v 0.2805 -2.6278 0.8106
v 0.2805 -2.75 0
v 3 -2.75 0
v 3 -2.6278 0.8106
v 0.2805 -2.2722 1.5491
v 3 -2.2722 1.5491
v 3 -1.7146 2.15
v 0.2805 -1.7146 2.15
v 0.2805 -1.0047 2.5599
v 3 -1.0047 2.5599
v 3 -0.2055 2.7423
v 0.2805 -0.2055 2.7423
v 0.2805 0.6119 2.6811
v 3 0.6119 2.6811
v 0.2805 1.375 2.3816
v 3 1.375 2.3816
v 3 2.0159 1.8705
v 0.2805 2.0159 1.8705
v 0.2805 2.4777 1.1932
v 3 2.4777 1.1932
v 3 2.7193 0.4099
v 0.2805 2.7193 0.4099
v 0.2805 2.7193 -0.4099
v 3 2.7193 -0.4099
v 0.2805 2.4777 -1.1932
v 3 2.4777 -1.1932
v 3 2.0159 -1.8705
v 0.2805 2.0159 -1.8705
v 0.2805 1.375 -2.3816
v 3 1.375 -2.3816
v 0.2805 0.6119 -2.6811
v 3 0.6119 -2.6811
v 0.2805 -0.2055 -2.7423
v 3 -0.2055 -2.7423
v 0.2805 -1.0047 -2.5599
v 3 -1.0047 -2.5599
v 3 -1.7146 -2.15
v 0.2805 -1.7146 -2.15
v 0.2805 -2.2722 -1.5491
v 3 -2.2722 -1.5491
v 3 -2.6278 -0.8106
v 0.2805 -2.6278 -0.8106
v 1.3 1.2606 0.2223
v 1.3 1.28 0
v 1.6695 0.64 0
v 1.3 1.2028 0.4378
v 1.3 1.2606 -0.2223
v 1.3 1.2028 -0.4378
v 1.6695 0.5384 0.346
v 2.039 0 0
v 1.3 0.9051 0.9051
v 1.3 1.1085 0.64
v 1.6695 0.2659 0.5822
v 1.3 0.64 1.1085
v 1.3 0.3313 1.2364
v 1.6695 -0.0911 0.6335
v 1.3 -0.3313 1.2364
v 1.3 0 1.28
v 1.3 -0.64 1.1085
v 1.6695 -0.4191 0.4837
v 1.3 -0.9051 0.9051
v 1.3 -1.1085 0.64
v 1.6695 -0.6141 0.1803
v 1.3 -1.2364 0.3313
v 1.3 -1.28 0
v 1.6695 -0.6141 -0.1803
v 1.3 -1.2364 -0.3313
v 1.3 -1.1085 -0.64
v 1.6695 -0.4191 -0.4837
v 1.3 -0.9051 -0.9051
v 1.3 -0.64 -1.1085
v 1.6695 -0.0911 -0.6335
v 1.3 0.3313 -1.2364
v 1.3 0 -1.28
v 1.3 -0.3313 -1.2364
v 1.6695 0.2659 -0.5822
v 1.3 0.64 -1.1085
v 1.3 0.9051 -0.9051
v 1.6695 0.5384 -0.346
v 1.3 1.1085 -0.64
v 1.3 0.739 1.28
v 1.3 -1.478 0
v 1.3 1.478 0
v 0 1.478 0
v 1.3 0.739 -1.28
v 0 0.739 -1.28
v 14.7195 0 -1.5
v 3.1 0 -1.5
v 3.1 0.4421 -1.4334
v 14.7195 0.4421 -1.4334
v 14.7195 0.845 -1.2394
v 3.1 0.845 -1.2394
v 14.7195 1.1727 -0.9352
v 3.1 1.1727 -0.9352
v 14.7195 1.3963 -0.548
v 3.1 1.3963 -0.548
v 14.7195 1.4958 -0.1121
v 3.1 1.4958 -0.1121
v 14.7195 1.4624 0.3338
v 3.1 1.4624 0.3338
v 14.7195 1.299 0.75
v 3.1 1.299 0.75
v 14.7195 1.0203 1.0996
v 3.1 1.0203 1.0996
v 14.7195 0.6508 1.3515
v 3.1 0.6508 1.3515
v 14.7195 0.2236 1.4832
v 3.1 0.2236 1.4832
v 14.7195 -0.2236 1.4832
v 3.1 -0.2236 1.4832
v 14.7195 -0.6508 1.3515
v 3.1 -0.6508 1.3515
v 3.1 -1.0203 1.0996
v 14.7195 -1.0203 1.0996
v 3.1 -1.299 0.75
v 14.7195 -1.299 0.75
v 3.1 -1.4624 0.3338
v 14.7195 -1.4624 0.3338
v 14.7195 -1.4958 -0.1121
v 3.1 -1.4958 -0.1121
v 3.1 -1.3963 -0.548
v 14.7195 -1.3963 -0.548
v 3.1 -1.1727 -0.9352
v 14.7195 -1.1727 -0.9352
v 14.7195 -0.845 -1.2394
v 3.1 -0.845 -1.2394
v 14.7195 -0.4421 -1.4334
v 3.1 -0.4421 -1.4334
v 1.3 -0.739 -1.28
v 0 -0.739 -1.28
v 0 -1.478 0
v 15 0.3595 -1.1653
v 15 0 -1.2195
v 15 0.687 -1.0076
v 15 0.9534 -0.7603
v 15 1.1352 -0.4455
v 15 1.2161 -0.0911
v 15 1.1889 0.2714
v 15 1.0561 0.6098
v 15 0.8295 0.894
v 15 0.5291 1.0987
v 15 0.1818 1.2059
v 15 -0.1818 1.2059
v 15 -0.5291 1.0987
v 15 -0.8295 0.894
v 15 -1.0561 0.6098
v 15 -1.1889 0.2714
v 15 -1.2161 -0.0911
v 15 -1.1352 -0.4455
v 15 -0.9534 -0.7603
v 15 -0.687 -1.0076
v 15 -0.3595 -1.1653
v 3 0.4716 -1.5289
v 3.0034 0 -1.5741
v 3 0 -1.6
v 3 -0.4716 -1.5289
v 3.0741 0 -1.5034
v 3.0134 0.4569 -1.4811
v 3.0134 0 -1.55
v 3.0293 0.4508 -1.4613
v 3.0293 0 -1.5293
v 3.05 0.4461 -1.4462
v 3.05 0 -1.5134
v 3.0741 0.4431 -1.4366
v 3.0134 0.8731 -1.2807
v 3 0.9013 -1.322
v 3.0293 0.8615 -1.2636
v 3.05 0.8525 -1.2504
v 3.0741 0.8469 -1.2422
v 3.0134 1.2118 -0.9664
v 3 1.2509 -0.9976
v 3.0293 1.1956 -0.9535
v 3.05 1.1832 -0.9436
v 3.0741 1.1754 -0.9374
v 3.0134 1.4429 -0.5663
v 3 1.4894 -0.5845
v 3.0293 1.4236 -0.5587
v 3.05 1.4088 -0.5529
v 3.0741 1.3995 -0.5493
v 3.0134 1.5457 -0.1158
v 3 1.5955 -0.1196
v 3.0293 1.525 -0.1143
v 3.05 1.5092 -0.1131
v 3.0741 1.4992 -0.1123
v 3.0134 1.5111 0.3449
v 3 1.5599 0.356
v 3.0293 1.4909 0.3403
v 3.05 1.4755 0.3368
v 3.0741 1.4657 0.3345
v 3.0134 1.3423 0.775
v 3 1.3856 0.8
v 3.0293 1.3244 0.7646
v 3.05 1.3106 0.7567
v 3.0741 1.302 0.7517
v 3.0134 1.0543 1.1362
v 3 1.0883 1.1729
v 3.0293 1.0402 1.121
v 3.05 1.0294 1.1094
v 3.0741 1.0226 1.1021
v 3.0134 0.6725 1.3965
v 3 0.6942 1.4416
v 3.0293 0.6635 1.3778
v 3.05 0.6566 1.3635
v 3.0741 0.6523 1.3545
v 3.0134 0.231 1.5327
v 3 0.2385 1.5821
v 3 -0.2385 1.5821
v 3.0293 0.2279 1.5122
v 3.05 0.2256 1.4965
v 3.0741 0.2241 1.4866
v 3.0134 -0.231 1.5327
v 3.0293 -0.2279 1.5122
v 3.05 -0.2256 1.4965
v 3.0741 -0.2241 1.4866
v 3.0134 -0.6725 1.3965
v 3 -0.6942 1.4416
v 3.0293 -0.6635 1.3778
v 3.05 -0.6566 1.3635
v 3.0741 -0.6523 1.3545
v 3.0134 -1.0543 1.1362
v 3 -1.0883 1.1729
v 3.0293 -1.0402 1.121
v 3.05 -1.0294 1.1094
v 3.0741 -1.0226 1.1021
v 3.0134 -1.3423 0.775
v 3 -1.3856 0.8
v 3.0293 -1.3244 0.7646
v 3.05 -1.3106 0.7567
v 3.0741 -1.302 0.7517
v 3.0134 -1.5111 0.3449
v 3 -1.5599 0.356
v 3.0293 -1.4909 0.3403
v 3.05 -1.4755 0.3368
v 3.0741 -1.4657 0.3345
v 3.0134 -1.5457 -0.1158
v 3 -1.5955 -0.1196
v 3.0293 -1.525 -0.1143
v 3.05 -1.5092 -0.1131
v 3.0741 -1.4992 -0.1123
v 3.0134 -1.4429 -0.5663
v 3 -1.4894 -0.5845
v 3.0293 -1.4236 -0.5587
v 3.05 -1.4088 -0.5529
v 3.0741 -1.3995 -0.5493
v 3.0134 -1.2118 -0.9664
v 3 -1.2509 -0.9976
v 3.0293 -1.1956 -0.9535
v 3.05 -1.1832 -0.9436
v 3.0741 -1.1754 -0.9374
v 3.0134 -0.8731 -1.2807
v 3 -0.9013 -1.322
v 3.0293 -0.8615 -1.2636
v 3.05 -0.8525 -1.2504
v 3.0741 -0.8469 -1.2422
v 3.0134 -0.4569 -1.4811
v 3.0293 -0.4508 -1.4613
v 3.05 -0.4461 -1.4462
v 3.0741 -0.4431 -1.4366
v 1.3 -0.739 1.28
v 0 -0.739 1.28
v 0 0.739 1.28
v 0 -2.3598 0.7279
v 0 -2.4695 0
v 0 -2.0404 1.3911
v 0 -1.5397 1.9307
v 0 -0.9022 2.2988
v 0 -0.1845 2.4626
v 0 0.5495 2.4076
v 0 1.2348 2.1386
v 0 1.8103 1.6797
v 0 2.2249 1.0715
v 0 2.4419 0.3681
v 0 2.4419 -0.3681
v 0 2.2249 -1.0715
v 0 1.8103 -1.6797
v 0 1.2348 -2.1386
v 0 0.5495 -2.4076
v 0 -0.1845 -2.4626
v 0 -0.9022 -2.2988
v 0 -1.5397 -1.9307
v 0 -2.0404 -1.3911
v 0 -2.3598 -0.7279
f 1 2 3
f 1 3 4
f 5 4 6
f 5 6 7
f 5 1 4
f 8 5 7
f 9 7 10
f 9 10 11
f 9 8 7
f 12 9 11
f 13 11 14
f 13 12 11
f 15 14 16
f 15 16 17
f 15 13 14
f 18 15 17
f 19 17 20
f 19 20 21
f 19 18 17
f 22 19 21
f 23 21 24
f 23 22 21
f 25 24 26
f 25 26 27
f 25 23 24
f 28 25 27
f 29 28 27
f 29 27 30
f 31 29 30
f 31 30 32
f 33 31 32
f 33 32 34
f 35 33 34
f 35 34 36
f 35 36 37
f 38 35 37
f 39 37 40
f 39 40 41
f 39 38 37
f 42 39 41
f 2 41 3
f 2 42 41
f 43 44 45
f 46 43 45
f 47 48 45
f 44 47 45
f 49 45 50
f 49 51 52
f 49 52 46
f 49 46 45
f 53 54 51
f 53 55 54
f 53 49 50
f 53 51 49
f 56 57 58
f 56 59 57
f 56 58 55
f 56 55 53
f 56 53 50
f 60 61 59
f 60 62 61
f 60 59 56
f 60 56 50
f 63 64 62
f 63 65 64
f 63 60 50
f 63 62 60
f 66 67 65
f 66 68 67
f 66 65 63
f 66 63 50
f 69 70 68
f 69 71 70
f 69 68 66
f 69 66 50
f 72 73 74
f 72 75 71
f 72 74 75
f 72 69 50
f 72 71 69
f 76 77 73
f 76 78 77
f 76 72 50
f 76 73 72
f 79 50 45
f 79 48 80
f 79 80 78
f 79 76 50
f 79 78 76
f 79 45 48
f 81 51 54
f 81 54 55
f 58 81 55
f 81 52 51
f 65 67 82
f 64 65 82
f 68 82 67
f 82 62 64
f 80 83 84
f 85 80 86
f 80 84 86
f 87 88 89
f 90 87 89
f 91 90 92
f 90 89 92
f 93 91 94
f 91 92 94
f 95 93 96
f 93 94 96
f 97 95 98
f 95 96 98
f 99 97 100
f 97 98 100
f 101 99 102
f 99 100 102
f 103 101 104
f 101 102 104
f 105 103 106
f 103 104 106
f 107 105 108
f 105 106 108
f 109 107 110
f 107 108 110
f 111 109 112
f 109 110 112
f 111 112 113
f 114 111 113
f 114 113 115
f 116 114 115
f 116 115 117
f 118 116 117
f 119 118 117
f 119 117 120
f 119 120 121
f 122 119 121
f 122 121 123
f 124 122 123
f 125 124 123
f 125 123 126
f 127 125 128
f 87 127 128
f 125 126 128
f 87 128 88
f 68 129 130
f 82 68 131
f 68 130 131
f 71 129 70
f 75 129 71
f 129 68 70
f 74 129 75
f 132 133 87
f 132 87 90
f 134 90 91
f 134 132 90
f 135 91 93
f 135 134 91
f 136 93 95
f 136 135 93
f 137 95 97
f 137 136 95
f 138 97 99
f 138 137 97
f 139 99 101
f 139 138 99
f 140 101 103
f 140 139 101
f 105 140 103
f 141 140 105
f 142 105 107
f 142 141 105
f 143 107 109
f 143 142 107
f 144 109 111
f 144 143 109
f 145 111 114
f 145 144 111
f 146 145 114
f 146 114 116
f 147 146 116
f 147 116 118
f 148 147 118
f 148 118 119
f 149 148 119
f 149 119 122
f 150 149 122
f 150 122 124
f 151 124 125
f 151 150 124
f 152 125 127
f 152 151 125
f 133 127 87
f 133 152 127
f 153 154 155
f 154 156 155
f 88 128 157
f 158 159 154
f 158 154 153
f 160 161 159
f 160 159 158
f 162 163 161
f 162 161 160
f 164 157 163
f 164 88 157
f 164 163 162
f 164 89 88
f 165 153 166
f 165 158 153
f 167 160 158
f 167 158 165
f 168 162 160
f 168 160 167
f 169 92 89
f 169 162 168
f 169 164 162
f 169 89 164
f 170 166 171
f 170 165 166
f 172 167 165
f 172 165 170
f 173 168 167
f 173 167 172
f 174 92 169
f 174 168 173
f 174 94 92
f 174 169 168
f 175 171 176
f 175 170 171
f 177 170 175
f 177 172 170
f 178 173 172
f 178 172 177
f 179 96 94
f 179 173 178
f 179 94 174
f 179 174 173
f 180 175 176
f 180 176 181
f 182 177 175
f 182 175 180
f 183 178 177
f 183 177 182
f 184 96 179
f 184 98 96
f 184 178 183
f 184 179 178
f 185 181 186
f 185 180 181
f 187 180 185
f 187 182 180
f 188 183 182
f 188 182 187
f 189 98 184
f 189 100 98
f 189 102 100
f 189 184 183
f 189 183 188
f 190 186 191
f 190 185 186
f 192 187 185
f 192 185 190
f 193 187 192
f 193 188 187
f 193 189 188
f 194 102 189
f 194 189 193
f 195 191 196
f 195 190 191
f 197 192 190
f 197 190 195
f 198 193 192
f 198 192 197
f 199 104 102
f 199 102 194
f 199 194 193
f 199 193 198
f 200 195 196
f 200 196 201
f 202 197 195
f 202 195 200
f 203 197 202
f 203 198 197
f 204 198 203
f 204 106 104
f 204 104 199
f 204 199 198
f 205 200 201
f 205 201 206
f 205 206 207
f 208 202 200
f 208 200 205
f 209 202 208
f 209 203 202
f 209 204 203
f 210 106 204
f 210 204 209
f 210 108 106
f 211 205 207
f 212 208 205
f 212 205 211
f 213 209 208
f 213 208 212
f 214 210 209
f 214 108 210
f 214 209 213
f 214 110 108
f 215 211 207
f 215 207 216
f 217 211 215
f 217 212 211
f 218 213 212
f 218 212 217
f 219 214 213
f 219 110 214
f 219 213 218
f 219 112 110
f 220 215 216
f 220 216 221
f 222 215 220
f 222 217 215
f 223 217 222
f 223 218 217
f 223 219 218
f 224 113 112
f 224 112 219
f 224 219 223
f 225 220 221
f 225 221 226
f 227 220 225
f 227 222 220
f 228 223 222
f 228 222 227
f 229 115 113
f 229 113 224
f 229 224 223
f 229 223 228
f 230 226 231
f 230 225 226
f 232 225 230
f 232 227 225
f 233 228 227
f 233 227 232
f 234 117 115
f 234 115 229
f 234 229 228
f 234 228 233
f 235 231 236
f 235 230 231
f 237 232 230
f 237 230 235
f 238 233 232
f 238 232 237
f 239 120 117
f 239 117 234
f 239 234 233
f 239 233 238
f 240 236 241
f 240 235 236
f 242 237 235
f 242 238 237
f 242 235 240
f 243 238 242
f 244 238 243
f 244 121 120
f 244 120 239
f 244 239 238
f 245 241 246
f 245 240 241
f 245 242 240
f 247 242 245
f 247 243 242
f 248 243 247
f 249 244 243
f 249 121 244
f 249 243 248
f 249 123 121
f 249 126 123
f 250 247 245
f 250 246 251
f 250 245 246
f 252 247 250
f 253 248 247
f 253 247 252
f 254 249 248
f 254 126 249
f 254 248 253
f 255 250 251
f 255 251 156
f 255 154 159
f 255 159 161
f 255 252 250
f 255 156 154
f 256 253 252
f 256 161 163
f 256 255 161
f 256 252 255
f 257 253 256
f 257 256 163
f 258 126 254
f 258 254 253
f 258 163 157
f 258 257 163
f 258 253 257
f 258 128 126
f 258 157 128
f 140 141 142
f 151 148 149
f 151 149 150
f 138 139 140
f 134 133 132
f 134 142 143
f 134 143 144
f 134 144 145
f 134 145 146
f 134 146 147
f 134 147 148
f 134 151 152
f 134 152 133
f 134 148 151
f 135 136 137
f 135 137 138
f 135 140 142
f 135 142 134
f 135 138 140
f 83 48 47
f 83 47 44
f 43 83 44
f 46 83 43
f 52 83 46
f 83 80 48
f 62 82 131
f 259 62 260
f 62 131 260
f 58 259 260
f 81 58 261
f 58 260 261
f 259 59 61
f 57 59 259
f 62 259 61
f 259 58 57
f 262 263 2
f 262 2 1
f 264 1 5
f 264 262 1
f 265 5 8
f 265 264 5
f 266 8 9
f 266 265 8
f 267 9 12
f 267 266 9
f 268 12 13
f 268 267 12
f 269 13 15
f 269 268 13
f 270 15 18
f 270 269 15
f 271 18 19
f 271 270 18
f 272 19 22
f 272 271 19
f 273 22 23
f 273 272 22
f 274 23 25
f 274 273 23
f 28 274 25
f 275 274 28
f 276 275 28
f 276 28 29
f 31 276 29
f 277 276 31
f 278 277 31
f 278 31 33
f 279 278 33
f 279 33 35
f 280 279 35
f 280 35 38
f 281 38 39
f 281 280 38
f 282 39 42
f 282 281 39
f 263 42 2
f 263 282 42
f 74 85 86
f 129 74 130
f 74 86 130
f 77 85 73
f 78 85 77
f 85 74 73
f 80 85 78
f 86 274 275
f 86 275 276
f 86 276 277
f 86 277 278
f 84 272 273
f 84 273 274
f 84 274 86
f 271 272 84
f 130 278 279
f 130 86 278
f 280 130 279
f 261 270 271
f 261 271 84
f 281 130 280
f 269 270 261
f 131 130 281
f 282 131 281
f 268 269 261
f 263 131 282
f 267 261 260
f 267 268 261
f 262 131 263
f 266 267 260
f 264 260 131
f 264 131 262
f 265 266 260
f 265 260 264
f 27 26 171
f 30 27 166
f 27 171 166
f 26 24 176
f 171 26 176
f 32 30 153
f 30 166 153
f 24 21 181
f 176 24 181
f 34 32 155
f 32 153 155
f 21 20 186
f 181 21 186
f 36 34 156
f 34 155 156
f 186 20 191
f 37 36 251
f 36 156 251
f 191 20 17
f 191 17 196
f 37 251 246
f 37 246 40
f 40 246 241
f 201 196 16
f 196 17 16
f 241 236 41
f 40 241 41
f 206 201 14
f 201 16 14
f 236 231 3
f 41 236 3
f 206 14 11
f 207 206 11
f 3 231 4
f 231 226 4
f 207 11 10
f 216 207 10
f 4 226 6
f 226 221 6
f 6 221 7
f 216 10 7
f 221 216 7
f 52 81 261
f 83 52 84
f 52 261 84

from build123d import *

# Parameters (mm, degrees)
SKETCH1_R           = 2.75
BOSS_EXTRUDE1_DEPTH = 3
CUT_EXTRUDE1_DEPTH  = 1.3
SKETCH9_R           = 1.5
BOSS_EXTRUDE2_DEPTH = 12
CHAMFER1_SIZE       = 0.2805
FILLET1_R           = 0.1


with BuildPart() as part:
    # Sketch1 → Boss-Extrude1 (new body)
    with BuildSketch(Plane(origin=(0, 0, 0), x_dir=(0, -1, 0), z_dir=(-1, 0, 0))):
        Circle(SKETCH1_R)
    extrude(amount=-BOSS_EXTRUDE1_DEPTH)

    # Sketch2 → Cut-Extrude1 (cut)
    with BuildSketch(Plane.ZY):
        Polygon((0, -1.478016689), (1.28, -0.739008345), (1.28, 0.739008345), (0, 1.478016689), (-1.28, 0.739008345), (-1.28, -0.739008345), align=None)
    extrude(amount=-CUT_EXTRUDE1_DEPTH, mode=Mode.SUBTRACT)

    # Sketch4 → Cut-Revolve1 (revolve, cut)
    with BuildSketch(Plane.XY):
        Polygon((1.3, 1.28), (1.3, 0), (2.039008345, 0), align=None)
    revolve(axis=Axis((1.3, 0, 0), (1, 0, 0)), mode=Mode.SUBTRACT)

    # Sketch9 → Boss-Extrude2 (add)
    with BuildSketch(Plane(origin=(3, 0, 0), x_dir=(0, 0, -1), z_dir=(1, 0, 0))):
        Circle(SKETCH9_R)
    extrude(amount=BOSS_EXTRUDE2_DEPTH)

    # Chamfer1
    chamfer1_edges = [part.edges().sort_by_distance(p)[0] for p in [
        (0, 2.75, 0),
        (15, 0, 1.5),
    ]]
    chamfer(chamfer1_edges, length=CHAMFER1_SIZE)

    # Fillet1
    fillet1_edges = [part.edges().sort_by_distance(p)[0] for p in [
        (3, 0, 1.5),
    ]]
    fillet(fillet1_edges, radius=FILLET1_R)


solid = part.part
